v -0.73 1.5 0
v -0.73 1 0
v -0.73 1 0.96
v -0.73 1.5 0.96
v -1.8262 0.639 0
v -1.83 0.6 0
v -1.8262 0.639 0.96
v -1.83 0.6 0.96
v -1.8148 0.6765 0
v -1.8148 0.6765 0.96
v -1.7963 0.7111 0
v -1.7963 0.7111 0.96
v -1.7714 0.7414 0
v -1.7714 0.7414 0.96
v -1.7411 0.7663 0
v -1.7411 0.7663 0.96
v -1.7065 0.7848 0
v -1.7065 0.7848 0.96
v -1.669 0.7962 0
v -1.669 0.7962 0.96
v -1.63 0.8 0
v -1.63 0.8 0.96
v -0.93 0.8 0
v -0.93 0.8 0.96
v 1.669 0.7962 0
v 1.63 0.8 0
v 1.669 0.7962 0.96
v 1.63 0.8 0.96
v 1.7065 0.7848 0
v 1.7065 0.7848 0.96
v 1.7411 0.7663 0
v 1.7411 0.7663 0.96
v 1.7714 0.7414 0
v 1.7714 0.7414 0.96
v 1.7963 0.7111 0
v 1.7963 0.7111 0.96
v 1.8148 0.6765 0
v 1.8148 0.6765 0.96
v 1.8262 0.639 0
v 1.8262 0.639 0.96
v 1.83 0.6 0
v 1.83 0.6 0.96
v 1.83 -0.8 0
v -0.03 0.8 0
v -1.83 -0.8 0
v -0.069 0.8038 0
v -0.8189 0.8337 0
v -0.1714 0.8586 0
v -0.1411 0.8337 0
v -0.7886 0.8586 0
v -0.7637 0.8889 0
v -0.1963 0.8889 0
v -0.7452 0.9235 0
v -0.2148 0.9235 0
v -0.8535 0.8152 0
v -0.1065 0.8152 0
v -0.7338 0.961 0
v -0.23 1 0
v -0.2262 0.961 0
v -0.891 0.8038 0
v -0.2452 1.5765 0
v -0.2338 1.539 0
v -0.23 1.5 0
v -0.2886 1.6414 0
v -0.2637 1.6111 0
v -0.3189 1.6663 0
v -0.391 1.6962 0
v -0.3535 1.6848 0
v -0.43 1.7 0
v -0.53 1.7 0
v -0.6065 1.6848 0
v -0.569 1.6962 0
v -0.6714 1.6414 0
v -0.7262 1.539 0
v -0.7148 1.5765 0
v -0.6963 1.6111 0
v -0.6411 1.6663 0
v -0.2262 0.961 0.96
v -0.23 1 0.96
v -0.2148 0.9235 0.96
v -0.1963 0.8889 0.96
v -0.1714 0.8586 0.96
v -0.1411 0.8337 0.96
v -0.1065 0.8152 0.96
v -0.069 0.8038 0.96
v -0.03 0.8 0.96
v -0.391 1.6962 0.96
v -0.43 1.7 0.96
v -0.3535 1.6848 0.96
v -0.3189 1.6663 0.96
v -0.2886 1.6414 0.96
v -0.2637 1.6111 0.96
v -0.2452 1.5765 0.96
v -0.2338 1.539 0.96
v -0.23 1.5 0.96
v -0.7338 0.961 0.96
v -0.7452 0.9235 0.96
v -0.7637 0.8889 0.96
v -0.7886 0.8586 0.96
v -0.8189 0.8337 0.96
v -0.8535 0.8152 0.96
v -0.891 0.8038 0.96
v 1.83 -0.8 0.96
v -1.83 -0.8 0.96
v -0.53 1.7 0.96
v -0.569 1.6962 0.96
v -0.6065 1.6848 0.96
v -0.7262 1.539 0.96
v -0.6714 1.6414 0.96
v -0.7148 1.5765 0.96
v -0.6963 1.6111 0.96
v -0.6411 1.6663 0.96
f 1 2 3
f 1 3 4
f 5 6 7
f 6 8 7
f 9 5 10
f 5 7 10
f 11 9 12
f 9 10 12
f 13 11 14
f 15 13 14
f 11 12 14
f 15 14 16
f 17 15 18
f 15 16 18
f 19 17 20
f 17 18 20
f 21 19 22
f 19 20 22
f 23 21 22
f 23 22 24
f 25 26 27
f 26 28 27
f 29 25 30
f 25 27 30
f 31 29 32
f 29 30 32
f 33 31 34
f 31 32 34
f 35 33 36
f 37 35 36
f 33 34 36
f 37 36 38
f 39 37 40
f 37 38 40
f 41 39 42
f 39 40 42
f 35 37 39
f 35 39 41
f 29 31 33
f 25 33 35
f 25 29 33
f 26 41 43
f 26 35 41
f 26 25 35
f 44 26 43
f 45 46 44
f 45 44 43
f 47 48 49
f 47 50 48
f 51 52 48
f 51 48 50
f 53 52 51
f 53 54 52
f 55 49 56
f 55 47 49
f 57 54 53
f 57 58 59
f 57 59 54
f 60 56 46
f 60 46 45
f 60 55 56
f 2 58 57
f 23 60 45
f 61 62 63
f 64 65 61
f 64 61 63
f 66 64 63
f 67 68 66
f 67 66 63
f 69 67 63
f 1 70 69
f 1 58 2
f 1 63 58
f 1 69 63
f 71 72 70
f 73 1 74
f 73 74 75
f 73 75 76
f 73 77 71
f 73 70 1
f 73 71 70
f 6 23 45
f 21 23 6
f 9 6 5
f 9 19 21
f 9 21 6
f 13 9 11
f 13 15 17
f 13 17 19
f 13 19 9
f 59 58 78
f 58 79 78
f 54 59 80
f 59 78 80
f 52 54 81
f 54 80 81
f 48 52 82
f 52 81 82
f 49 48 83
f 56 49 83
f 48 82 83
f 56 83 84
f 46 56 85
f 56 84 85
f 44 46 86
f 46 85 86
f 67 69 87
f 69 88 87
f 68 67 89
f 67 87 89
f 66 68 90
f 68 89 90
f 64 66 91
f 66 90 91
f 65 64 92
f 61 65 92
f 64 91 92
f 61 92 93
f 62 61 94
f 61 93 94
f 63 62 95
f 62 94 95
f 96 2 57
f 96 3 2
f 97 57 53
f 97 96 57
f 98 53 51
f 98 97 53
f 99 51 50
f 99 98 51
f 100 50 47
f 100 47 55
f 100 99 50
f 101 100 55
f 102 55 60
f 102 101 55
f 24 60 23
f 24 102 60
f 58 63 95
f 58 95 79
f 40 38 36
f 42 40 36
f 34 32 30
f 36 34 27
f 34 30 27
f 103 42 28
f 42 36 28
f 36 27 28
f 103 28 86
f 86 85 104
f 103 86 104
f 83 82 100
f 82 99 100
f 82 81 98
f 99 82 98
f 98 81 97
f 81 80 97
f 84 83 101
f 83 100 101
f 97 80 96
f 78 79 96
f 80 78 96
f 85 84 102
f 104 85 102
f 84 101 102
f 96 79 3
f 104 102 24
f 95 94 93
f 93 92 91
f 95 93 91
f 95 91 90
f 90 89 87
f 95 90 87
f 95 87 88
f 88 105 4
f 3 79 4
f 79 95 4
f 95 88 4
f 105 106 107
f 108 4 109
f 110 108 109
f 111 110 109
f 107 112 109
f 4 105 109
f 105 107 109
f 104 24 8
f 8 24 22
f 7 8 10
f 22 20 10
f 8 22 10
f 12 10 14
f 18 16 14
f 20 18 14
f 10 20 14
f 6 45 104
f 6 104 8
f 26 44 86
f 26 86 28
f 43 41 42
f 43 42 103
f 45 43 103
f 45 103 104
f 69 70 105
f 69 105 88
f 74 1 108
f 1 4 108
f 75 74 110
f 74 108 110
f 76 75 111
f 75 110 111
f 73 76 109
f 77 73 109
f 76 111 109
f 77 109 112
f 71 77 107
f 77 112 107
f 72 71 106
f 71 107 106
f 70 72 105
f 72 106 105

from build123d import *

# Parameters (mm, degrees)
BOSS_EXTRUDE1_DEPTH = 0.96
FILLET1_R           = 0.2


with BuildPart() as part:
    # Sketch1 → Boss-Extrude1 (new body)
    with BuildSketch(Plane.XY):
        Polygon((-0.73, 0.8), (-0.73, 1.7), (-0.23, 1.7), (-0.23, 0.8), (1.83, 0.8), (1.83, -0.8), (-1.83, -0.8), (-1.83, 0.8), align=None)
    extrude(amount=BOSS_EXTRUDE1_DEPTH)

    # Fillet1
    fillet1_edges = [part.edges().sort_by_distance(p)[0] for p in [
        (-1.83, 0.8, 0.48),
        (-0.73, 0.8, 0.48),
        (-0.73, 1.7, 0.48),
        (-0.23, 1.7, 0.48),
        (-0.23, 0.8, 0.48),
        (1.83, 0.8, 0.48),
    ]]
    fillet(fillet1_edges, radius=FILLET1_R)


solid = part.part
